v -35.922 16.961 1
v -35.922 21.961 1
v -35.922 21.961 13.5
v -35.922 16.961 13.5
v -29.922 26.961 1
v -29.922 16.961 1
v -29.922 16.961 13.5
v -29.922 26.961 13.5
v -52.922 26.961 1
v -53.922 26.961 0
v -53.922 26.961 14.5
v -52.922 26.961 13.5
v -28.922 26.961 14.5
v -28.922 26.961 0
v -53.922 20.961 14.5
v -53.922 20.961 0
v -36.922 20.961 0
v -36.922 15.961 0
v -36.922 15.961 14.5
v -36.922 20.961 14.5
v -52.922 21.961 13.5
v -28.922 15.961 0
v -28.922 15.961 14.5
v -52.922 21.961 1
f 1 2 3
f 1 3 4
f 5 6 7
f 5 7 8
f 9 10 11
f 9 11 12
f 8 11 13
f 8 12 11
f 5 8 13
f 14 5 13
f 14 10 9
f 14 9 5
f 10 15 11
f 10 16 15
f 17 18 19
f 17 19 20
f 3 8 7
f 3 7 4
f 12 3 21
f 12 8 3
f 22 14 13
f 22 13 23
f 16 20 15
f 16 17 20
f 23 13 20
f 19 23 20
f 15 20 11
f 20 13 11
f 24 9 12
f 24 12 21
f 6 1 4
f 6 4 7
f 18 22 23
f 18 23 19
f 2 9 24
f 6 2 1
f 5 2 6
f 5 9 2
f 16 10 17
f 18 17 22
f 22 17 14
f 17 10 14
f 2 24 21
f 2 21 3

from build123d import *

# Parameters (mm, degrees)
EXTRUDE_1_DEPTH = 1
EXTRUDE_2_DEPTH = 12.5
EXTRUDE_4_DEPTH = 1


with BuildPart() as part:
    # 草图1 → 凸台-拉伸1 (new body)
    with BuildSketch(Plane.XY):
        Polygon((-53.921953221, 26.960976611), (-53.921953221, 20.960976611), (-36.921953221, 20.960976611), (-36.921953221, 15.960976611), (-28.921953221, 15.960976611), (-28.921953221, 26.960976611), align=None)
    extrude(amount=EXTRUDE_1_DEPTH)

    # 草图2 → 凸台-拉伸2 (add)
    with BuildSketch(Plane.XY.offset(1)):
        Polygon((-53.921953221, 26.960976611), (-52.921953221, 26.960976611), (-52.921953221, 21.960976611), (-35.921953221, 21.960976611), (-35.921953221, 16.960976611), (-29.921953221, 16.960976611), (-29.921953221, 26.960976611), (-28.921953221, 26.960976611), (-28.921953221, 15.960976611), (-36.921953221, 15.960976611), (-36.921953221, 20.960976611), (-53.921953221, 20.960976611), align=None)
    extrude(amount=EXTRUDE_2_DEPTH)

    # 草图4 → 凸台-拉伸4 (add)
    with BuildSketch(Plane.XY.offset(13.5)):
        Polygon((-53.921953221, 26.960976611), (-28.921953221, 26.960976611), (-28.921953221, 15.960976611), (-36.921953221, 15.960976611), (-36.921953221, 20.960976611), (-53.921953221, 20.960976611), align=None)
    extrude(amount=EXTRUDE_4_DEPTH)


solid = part.part
